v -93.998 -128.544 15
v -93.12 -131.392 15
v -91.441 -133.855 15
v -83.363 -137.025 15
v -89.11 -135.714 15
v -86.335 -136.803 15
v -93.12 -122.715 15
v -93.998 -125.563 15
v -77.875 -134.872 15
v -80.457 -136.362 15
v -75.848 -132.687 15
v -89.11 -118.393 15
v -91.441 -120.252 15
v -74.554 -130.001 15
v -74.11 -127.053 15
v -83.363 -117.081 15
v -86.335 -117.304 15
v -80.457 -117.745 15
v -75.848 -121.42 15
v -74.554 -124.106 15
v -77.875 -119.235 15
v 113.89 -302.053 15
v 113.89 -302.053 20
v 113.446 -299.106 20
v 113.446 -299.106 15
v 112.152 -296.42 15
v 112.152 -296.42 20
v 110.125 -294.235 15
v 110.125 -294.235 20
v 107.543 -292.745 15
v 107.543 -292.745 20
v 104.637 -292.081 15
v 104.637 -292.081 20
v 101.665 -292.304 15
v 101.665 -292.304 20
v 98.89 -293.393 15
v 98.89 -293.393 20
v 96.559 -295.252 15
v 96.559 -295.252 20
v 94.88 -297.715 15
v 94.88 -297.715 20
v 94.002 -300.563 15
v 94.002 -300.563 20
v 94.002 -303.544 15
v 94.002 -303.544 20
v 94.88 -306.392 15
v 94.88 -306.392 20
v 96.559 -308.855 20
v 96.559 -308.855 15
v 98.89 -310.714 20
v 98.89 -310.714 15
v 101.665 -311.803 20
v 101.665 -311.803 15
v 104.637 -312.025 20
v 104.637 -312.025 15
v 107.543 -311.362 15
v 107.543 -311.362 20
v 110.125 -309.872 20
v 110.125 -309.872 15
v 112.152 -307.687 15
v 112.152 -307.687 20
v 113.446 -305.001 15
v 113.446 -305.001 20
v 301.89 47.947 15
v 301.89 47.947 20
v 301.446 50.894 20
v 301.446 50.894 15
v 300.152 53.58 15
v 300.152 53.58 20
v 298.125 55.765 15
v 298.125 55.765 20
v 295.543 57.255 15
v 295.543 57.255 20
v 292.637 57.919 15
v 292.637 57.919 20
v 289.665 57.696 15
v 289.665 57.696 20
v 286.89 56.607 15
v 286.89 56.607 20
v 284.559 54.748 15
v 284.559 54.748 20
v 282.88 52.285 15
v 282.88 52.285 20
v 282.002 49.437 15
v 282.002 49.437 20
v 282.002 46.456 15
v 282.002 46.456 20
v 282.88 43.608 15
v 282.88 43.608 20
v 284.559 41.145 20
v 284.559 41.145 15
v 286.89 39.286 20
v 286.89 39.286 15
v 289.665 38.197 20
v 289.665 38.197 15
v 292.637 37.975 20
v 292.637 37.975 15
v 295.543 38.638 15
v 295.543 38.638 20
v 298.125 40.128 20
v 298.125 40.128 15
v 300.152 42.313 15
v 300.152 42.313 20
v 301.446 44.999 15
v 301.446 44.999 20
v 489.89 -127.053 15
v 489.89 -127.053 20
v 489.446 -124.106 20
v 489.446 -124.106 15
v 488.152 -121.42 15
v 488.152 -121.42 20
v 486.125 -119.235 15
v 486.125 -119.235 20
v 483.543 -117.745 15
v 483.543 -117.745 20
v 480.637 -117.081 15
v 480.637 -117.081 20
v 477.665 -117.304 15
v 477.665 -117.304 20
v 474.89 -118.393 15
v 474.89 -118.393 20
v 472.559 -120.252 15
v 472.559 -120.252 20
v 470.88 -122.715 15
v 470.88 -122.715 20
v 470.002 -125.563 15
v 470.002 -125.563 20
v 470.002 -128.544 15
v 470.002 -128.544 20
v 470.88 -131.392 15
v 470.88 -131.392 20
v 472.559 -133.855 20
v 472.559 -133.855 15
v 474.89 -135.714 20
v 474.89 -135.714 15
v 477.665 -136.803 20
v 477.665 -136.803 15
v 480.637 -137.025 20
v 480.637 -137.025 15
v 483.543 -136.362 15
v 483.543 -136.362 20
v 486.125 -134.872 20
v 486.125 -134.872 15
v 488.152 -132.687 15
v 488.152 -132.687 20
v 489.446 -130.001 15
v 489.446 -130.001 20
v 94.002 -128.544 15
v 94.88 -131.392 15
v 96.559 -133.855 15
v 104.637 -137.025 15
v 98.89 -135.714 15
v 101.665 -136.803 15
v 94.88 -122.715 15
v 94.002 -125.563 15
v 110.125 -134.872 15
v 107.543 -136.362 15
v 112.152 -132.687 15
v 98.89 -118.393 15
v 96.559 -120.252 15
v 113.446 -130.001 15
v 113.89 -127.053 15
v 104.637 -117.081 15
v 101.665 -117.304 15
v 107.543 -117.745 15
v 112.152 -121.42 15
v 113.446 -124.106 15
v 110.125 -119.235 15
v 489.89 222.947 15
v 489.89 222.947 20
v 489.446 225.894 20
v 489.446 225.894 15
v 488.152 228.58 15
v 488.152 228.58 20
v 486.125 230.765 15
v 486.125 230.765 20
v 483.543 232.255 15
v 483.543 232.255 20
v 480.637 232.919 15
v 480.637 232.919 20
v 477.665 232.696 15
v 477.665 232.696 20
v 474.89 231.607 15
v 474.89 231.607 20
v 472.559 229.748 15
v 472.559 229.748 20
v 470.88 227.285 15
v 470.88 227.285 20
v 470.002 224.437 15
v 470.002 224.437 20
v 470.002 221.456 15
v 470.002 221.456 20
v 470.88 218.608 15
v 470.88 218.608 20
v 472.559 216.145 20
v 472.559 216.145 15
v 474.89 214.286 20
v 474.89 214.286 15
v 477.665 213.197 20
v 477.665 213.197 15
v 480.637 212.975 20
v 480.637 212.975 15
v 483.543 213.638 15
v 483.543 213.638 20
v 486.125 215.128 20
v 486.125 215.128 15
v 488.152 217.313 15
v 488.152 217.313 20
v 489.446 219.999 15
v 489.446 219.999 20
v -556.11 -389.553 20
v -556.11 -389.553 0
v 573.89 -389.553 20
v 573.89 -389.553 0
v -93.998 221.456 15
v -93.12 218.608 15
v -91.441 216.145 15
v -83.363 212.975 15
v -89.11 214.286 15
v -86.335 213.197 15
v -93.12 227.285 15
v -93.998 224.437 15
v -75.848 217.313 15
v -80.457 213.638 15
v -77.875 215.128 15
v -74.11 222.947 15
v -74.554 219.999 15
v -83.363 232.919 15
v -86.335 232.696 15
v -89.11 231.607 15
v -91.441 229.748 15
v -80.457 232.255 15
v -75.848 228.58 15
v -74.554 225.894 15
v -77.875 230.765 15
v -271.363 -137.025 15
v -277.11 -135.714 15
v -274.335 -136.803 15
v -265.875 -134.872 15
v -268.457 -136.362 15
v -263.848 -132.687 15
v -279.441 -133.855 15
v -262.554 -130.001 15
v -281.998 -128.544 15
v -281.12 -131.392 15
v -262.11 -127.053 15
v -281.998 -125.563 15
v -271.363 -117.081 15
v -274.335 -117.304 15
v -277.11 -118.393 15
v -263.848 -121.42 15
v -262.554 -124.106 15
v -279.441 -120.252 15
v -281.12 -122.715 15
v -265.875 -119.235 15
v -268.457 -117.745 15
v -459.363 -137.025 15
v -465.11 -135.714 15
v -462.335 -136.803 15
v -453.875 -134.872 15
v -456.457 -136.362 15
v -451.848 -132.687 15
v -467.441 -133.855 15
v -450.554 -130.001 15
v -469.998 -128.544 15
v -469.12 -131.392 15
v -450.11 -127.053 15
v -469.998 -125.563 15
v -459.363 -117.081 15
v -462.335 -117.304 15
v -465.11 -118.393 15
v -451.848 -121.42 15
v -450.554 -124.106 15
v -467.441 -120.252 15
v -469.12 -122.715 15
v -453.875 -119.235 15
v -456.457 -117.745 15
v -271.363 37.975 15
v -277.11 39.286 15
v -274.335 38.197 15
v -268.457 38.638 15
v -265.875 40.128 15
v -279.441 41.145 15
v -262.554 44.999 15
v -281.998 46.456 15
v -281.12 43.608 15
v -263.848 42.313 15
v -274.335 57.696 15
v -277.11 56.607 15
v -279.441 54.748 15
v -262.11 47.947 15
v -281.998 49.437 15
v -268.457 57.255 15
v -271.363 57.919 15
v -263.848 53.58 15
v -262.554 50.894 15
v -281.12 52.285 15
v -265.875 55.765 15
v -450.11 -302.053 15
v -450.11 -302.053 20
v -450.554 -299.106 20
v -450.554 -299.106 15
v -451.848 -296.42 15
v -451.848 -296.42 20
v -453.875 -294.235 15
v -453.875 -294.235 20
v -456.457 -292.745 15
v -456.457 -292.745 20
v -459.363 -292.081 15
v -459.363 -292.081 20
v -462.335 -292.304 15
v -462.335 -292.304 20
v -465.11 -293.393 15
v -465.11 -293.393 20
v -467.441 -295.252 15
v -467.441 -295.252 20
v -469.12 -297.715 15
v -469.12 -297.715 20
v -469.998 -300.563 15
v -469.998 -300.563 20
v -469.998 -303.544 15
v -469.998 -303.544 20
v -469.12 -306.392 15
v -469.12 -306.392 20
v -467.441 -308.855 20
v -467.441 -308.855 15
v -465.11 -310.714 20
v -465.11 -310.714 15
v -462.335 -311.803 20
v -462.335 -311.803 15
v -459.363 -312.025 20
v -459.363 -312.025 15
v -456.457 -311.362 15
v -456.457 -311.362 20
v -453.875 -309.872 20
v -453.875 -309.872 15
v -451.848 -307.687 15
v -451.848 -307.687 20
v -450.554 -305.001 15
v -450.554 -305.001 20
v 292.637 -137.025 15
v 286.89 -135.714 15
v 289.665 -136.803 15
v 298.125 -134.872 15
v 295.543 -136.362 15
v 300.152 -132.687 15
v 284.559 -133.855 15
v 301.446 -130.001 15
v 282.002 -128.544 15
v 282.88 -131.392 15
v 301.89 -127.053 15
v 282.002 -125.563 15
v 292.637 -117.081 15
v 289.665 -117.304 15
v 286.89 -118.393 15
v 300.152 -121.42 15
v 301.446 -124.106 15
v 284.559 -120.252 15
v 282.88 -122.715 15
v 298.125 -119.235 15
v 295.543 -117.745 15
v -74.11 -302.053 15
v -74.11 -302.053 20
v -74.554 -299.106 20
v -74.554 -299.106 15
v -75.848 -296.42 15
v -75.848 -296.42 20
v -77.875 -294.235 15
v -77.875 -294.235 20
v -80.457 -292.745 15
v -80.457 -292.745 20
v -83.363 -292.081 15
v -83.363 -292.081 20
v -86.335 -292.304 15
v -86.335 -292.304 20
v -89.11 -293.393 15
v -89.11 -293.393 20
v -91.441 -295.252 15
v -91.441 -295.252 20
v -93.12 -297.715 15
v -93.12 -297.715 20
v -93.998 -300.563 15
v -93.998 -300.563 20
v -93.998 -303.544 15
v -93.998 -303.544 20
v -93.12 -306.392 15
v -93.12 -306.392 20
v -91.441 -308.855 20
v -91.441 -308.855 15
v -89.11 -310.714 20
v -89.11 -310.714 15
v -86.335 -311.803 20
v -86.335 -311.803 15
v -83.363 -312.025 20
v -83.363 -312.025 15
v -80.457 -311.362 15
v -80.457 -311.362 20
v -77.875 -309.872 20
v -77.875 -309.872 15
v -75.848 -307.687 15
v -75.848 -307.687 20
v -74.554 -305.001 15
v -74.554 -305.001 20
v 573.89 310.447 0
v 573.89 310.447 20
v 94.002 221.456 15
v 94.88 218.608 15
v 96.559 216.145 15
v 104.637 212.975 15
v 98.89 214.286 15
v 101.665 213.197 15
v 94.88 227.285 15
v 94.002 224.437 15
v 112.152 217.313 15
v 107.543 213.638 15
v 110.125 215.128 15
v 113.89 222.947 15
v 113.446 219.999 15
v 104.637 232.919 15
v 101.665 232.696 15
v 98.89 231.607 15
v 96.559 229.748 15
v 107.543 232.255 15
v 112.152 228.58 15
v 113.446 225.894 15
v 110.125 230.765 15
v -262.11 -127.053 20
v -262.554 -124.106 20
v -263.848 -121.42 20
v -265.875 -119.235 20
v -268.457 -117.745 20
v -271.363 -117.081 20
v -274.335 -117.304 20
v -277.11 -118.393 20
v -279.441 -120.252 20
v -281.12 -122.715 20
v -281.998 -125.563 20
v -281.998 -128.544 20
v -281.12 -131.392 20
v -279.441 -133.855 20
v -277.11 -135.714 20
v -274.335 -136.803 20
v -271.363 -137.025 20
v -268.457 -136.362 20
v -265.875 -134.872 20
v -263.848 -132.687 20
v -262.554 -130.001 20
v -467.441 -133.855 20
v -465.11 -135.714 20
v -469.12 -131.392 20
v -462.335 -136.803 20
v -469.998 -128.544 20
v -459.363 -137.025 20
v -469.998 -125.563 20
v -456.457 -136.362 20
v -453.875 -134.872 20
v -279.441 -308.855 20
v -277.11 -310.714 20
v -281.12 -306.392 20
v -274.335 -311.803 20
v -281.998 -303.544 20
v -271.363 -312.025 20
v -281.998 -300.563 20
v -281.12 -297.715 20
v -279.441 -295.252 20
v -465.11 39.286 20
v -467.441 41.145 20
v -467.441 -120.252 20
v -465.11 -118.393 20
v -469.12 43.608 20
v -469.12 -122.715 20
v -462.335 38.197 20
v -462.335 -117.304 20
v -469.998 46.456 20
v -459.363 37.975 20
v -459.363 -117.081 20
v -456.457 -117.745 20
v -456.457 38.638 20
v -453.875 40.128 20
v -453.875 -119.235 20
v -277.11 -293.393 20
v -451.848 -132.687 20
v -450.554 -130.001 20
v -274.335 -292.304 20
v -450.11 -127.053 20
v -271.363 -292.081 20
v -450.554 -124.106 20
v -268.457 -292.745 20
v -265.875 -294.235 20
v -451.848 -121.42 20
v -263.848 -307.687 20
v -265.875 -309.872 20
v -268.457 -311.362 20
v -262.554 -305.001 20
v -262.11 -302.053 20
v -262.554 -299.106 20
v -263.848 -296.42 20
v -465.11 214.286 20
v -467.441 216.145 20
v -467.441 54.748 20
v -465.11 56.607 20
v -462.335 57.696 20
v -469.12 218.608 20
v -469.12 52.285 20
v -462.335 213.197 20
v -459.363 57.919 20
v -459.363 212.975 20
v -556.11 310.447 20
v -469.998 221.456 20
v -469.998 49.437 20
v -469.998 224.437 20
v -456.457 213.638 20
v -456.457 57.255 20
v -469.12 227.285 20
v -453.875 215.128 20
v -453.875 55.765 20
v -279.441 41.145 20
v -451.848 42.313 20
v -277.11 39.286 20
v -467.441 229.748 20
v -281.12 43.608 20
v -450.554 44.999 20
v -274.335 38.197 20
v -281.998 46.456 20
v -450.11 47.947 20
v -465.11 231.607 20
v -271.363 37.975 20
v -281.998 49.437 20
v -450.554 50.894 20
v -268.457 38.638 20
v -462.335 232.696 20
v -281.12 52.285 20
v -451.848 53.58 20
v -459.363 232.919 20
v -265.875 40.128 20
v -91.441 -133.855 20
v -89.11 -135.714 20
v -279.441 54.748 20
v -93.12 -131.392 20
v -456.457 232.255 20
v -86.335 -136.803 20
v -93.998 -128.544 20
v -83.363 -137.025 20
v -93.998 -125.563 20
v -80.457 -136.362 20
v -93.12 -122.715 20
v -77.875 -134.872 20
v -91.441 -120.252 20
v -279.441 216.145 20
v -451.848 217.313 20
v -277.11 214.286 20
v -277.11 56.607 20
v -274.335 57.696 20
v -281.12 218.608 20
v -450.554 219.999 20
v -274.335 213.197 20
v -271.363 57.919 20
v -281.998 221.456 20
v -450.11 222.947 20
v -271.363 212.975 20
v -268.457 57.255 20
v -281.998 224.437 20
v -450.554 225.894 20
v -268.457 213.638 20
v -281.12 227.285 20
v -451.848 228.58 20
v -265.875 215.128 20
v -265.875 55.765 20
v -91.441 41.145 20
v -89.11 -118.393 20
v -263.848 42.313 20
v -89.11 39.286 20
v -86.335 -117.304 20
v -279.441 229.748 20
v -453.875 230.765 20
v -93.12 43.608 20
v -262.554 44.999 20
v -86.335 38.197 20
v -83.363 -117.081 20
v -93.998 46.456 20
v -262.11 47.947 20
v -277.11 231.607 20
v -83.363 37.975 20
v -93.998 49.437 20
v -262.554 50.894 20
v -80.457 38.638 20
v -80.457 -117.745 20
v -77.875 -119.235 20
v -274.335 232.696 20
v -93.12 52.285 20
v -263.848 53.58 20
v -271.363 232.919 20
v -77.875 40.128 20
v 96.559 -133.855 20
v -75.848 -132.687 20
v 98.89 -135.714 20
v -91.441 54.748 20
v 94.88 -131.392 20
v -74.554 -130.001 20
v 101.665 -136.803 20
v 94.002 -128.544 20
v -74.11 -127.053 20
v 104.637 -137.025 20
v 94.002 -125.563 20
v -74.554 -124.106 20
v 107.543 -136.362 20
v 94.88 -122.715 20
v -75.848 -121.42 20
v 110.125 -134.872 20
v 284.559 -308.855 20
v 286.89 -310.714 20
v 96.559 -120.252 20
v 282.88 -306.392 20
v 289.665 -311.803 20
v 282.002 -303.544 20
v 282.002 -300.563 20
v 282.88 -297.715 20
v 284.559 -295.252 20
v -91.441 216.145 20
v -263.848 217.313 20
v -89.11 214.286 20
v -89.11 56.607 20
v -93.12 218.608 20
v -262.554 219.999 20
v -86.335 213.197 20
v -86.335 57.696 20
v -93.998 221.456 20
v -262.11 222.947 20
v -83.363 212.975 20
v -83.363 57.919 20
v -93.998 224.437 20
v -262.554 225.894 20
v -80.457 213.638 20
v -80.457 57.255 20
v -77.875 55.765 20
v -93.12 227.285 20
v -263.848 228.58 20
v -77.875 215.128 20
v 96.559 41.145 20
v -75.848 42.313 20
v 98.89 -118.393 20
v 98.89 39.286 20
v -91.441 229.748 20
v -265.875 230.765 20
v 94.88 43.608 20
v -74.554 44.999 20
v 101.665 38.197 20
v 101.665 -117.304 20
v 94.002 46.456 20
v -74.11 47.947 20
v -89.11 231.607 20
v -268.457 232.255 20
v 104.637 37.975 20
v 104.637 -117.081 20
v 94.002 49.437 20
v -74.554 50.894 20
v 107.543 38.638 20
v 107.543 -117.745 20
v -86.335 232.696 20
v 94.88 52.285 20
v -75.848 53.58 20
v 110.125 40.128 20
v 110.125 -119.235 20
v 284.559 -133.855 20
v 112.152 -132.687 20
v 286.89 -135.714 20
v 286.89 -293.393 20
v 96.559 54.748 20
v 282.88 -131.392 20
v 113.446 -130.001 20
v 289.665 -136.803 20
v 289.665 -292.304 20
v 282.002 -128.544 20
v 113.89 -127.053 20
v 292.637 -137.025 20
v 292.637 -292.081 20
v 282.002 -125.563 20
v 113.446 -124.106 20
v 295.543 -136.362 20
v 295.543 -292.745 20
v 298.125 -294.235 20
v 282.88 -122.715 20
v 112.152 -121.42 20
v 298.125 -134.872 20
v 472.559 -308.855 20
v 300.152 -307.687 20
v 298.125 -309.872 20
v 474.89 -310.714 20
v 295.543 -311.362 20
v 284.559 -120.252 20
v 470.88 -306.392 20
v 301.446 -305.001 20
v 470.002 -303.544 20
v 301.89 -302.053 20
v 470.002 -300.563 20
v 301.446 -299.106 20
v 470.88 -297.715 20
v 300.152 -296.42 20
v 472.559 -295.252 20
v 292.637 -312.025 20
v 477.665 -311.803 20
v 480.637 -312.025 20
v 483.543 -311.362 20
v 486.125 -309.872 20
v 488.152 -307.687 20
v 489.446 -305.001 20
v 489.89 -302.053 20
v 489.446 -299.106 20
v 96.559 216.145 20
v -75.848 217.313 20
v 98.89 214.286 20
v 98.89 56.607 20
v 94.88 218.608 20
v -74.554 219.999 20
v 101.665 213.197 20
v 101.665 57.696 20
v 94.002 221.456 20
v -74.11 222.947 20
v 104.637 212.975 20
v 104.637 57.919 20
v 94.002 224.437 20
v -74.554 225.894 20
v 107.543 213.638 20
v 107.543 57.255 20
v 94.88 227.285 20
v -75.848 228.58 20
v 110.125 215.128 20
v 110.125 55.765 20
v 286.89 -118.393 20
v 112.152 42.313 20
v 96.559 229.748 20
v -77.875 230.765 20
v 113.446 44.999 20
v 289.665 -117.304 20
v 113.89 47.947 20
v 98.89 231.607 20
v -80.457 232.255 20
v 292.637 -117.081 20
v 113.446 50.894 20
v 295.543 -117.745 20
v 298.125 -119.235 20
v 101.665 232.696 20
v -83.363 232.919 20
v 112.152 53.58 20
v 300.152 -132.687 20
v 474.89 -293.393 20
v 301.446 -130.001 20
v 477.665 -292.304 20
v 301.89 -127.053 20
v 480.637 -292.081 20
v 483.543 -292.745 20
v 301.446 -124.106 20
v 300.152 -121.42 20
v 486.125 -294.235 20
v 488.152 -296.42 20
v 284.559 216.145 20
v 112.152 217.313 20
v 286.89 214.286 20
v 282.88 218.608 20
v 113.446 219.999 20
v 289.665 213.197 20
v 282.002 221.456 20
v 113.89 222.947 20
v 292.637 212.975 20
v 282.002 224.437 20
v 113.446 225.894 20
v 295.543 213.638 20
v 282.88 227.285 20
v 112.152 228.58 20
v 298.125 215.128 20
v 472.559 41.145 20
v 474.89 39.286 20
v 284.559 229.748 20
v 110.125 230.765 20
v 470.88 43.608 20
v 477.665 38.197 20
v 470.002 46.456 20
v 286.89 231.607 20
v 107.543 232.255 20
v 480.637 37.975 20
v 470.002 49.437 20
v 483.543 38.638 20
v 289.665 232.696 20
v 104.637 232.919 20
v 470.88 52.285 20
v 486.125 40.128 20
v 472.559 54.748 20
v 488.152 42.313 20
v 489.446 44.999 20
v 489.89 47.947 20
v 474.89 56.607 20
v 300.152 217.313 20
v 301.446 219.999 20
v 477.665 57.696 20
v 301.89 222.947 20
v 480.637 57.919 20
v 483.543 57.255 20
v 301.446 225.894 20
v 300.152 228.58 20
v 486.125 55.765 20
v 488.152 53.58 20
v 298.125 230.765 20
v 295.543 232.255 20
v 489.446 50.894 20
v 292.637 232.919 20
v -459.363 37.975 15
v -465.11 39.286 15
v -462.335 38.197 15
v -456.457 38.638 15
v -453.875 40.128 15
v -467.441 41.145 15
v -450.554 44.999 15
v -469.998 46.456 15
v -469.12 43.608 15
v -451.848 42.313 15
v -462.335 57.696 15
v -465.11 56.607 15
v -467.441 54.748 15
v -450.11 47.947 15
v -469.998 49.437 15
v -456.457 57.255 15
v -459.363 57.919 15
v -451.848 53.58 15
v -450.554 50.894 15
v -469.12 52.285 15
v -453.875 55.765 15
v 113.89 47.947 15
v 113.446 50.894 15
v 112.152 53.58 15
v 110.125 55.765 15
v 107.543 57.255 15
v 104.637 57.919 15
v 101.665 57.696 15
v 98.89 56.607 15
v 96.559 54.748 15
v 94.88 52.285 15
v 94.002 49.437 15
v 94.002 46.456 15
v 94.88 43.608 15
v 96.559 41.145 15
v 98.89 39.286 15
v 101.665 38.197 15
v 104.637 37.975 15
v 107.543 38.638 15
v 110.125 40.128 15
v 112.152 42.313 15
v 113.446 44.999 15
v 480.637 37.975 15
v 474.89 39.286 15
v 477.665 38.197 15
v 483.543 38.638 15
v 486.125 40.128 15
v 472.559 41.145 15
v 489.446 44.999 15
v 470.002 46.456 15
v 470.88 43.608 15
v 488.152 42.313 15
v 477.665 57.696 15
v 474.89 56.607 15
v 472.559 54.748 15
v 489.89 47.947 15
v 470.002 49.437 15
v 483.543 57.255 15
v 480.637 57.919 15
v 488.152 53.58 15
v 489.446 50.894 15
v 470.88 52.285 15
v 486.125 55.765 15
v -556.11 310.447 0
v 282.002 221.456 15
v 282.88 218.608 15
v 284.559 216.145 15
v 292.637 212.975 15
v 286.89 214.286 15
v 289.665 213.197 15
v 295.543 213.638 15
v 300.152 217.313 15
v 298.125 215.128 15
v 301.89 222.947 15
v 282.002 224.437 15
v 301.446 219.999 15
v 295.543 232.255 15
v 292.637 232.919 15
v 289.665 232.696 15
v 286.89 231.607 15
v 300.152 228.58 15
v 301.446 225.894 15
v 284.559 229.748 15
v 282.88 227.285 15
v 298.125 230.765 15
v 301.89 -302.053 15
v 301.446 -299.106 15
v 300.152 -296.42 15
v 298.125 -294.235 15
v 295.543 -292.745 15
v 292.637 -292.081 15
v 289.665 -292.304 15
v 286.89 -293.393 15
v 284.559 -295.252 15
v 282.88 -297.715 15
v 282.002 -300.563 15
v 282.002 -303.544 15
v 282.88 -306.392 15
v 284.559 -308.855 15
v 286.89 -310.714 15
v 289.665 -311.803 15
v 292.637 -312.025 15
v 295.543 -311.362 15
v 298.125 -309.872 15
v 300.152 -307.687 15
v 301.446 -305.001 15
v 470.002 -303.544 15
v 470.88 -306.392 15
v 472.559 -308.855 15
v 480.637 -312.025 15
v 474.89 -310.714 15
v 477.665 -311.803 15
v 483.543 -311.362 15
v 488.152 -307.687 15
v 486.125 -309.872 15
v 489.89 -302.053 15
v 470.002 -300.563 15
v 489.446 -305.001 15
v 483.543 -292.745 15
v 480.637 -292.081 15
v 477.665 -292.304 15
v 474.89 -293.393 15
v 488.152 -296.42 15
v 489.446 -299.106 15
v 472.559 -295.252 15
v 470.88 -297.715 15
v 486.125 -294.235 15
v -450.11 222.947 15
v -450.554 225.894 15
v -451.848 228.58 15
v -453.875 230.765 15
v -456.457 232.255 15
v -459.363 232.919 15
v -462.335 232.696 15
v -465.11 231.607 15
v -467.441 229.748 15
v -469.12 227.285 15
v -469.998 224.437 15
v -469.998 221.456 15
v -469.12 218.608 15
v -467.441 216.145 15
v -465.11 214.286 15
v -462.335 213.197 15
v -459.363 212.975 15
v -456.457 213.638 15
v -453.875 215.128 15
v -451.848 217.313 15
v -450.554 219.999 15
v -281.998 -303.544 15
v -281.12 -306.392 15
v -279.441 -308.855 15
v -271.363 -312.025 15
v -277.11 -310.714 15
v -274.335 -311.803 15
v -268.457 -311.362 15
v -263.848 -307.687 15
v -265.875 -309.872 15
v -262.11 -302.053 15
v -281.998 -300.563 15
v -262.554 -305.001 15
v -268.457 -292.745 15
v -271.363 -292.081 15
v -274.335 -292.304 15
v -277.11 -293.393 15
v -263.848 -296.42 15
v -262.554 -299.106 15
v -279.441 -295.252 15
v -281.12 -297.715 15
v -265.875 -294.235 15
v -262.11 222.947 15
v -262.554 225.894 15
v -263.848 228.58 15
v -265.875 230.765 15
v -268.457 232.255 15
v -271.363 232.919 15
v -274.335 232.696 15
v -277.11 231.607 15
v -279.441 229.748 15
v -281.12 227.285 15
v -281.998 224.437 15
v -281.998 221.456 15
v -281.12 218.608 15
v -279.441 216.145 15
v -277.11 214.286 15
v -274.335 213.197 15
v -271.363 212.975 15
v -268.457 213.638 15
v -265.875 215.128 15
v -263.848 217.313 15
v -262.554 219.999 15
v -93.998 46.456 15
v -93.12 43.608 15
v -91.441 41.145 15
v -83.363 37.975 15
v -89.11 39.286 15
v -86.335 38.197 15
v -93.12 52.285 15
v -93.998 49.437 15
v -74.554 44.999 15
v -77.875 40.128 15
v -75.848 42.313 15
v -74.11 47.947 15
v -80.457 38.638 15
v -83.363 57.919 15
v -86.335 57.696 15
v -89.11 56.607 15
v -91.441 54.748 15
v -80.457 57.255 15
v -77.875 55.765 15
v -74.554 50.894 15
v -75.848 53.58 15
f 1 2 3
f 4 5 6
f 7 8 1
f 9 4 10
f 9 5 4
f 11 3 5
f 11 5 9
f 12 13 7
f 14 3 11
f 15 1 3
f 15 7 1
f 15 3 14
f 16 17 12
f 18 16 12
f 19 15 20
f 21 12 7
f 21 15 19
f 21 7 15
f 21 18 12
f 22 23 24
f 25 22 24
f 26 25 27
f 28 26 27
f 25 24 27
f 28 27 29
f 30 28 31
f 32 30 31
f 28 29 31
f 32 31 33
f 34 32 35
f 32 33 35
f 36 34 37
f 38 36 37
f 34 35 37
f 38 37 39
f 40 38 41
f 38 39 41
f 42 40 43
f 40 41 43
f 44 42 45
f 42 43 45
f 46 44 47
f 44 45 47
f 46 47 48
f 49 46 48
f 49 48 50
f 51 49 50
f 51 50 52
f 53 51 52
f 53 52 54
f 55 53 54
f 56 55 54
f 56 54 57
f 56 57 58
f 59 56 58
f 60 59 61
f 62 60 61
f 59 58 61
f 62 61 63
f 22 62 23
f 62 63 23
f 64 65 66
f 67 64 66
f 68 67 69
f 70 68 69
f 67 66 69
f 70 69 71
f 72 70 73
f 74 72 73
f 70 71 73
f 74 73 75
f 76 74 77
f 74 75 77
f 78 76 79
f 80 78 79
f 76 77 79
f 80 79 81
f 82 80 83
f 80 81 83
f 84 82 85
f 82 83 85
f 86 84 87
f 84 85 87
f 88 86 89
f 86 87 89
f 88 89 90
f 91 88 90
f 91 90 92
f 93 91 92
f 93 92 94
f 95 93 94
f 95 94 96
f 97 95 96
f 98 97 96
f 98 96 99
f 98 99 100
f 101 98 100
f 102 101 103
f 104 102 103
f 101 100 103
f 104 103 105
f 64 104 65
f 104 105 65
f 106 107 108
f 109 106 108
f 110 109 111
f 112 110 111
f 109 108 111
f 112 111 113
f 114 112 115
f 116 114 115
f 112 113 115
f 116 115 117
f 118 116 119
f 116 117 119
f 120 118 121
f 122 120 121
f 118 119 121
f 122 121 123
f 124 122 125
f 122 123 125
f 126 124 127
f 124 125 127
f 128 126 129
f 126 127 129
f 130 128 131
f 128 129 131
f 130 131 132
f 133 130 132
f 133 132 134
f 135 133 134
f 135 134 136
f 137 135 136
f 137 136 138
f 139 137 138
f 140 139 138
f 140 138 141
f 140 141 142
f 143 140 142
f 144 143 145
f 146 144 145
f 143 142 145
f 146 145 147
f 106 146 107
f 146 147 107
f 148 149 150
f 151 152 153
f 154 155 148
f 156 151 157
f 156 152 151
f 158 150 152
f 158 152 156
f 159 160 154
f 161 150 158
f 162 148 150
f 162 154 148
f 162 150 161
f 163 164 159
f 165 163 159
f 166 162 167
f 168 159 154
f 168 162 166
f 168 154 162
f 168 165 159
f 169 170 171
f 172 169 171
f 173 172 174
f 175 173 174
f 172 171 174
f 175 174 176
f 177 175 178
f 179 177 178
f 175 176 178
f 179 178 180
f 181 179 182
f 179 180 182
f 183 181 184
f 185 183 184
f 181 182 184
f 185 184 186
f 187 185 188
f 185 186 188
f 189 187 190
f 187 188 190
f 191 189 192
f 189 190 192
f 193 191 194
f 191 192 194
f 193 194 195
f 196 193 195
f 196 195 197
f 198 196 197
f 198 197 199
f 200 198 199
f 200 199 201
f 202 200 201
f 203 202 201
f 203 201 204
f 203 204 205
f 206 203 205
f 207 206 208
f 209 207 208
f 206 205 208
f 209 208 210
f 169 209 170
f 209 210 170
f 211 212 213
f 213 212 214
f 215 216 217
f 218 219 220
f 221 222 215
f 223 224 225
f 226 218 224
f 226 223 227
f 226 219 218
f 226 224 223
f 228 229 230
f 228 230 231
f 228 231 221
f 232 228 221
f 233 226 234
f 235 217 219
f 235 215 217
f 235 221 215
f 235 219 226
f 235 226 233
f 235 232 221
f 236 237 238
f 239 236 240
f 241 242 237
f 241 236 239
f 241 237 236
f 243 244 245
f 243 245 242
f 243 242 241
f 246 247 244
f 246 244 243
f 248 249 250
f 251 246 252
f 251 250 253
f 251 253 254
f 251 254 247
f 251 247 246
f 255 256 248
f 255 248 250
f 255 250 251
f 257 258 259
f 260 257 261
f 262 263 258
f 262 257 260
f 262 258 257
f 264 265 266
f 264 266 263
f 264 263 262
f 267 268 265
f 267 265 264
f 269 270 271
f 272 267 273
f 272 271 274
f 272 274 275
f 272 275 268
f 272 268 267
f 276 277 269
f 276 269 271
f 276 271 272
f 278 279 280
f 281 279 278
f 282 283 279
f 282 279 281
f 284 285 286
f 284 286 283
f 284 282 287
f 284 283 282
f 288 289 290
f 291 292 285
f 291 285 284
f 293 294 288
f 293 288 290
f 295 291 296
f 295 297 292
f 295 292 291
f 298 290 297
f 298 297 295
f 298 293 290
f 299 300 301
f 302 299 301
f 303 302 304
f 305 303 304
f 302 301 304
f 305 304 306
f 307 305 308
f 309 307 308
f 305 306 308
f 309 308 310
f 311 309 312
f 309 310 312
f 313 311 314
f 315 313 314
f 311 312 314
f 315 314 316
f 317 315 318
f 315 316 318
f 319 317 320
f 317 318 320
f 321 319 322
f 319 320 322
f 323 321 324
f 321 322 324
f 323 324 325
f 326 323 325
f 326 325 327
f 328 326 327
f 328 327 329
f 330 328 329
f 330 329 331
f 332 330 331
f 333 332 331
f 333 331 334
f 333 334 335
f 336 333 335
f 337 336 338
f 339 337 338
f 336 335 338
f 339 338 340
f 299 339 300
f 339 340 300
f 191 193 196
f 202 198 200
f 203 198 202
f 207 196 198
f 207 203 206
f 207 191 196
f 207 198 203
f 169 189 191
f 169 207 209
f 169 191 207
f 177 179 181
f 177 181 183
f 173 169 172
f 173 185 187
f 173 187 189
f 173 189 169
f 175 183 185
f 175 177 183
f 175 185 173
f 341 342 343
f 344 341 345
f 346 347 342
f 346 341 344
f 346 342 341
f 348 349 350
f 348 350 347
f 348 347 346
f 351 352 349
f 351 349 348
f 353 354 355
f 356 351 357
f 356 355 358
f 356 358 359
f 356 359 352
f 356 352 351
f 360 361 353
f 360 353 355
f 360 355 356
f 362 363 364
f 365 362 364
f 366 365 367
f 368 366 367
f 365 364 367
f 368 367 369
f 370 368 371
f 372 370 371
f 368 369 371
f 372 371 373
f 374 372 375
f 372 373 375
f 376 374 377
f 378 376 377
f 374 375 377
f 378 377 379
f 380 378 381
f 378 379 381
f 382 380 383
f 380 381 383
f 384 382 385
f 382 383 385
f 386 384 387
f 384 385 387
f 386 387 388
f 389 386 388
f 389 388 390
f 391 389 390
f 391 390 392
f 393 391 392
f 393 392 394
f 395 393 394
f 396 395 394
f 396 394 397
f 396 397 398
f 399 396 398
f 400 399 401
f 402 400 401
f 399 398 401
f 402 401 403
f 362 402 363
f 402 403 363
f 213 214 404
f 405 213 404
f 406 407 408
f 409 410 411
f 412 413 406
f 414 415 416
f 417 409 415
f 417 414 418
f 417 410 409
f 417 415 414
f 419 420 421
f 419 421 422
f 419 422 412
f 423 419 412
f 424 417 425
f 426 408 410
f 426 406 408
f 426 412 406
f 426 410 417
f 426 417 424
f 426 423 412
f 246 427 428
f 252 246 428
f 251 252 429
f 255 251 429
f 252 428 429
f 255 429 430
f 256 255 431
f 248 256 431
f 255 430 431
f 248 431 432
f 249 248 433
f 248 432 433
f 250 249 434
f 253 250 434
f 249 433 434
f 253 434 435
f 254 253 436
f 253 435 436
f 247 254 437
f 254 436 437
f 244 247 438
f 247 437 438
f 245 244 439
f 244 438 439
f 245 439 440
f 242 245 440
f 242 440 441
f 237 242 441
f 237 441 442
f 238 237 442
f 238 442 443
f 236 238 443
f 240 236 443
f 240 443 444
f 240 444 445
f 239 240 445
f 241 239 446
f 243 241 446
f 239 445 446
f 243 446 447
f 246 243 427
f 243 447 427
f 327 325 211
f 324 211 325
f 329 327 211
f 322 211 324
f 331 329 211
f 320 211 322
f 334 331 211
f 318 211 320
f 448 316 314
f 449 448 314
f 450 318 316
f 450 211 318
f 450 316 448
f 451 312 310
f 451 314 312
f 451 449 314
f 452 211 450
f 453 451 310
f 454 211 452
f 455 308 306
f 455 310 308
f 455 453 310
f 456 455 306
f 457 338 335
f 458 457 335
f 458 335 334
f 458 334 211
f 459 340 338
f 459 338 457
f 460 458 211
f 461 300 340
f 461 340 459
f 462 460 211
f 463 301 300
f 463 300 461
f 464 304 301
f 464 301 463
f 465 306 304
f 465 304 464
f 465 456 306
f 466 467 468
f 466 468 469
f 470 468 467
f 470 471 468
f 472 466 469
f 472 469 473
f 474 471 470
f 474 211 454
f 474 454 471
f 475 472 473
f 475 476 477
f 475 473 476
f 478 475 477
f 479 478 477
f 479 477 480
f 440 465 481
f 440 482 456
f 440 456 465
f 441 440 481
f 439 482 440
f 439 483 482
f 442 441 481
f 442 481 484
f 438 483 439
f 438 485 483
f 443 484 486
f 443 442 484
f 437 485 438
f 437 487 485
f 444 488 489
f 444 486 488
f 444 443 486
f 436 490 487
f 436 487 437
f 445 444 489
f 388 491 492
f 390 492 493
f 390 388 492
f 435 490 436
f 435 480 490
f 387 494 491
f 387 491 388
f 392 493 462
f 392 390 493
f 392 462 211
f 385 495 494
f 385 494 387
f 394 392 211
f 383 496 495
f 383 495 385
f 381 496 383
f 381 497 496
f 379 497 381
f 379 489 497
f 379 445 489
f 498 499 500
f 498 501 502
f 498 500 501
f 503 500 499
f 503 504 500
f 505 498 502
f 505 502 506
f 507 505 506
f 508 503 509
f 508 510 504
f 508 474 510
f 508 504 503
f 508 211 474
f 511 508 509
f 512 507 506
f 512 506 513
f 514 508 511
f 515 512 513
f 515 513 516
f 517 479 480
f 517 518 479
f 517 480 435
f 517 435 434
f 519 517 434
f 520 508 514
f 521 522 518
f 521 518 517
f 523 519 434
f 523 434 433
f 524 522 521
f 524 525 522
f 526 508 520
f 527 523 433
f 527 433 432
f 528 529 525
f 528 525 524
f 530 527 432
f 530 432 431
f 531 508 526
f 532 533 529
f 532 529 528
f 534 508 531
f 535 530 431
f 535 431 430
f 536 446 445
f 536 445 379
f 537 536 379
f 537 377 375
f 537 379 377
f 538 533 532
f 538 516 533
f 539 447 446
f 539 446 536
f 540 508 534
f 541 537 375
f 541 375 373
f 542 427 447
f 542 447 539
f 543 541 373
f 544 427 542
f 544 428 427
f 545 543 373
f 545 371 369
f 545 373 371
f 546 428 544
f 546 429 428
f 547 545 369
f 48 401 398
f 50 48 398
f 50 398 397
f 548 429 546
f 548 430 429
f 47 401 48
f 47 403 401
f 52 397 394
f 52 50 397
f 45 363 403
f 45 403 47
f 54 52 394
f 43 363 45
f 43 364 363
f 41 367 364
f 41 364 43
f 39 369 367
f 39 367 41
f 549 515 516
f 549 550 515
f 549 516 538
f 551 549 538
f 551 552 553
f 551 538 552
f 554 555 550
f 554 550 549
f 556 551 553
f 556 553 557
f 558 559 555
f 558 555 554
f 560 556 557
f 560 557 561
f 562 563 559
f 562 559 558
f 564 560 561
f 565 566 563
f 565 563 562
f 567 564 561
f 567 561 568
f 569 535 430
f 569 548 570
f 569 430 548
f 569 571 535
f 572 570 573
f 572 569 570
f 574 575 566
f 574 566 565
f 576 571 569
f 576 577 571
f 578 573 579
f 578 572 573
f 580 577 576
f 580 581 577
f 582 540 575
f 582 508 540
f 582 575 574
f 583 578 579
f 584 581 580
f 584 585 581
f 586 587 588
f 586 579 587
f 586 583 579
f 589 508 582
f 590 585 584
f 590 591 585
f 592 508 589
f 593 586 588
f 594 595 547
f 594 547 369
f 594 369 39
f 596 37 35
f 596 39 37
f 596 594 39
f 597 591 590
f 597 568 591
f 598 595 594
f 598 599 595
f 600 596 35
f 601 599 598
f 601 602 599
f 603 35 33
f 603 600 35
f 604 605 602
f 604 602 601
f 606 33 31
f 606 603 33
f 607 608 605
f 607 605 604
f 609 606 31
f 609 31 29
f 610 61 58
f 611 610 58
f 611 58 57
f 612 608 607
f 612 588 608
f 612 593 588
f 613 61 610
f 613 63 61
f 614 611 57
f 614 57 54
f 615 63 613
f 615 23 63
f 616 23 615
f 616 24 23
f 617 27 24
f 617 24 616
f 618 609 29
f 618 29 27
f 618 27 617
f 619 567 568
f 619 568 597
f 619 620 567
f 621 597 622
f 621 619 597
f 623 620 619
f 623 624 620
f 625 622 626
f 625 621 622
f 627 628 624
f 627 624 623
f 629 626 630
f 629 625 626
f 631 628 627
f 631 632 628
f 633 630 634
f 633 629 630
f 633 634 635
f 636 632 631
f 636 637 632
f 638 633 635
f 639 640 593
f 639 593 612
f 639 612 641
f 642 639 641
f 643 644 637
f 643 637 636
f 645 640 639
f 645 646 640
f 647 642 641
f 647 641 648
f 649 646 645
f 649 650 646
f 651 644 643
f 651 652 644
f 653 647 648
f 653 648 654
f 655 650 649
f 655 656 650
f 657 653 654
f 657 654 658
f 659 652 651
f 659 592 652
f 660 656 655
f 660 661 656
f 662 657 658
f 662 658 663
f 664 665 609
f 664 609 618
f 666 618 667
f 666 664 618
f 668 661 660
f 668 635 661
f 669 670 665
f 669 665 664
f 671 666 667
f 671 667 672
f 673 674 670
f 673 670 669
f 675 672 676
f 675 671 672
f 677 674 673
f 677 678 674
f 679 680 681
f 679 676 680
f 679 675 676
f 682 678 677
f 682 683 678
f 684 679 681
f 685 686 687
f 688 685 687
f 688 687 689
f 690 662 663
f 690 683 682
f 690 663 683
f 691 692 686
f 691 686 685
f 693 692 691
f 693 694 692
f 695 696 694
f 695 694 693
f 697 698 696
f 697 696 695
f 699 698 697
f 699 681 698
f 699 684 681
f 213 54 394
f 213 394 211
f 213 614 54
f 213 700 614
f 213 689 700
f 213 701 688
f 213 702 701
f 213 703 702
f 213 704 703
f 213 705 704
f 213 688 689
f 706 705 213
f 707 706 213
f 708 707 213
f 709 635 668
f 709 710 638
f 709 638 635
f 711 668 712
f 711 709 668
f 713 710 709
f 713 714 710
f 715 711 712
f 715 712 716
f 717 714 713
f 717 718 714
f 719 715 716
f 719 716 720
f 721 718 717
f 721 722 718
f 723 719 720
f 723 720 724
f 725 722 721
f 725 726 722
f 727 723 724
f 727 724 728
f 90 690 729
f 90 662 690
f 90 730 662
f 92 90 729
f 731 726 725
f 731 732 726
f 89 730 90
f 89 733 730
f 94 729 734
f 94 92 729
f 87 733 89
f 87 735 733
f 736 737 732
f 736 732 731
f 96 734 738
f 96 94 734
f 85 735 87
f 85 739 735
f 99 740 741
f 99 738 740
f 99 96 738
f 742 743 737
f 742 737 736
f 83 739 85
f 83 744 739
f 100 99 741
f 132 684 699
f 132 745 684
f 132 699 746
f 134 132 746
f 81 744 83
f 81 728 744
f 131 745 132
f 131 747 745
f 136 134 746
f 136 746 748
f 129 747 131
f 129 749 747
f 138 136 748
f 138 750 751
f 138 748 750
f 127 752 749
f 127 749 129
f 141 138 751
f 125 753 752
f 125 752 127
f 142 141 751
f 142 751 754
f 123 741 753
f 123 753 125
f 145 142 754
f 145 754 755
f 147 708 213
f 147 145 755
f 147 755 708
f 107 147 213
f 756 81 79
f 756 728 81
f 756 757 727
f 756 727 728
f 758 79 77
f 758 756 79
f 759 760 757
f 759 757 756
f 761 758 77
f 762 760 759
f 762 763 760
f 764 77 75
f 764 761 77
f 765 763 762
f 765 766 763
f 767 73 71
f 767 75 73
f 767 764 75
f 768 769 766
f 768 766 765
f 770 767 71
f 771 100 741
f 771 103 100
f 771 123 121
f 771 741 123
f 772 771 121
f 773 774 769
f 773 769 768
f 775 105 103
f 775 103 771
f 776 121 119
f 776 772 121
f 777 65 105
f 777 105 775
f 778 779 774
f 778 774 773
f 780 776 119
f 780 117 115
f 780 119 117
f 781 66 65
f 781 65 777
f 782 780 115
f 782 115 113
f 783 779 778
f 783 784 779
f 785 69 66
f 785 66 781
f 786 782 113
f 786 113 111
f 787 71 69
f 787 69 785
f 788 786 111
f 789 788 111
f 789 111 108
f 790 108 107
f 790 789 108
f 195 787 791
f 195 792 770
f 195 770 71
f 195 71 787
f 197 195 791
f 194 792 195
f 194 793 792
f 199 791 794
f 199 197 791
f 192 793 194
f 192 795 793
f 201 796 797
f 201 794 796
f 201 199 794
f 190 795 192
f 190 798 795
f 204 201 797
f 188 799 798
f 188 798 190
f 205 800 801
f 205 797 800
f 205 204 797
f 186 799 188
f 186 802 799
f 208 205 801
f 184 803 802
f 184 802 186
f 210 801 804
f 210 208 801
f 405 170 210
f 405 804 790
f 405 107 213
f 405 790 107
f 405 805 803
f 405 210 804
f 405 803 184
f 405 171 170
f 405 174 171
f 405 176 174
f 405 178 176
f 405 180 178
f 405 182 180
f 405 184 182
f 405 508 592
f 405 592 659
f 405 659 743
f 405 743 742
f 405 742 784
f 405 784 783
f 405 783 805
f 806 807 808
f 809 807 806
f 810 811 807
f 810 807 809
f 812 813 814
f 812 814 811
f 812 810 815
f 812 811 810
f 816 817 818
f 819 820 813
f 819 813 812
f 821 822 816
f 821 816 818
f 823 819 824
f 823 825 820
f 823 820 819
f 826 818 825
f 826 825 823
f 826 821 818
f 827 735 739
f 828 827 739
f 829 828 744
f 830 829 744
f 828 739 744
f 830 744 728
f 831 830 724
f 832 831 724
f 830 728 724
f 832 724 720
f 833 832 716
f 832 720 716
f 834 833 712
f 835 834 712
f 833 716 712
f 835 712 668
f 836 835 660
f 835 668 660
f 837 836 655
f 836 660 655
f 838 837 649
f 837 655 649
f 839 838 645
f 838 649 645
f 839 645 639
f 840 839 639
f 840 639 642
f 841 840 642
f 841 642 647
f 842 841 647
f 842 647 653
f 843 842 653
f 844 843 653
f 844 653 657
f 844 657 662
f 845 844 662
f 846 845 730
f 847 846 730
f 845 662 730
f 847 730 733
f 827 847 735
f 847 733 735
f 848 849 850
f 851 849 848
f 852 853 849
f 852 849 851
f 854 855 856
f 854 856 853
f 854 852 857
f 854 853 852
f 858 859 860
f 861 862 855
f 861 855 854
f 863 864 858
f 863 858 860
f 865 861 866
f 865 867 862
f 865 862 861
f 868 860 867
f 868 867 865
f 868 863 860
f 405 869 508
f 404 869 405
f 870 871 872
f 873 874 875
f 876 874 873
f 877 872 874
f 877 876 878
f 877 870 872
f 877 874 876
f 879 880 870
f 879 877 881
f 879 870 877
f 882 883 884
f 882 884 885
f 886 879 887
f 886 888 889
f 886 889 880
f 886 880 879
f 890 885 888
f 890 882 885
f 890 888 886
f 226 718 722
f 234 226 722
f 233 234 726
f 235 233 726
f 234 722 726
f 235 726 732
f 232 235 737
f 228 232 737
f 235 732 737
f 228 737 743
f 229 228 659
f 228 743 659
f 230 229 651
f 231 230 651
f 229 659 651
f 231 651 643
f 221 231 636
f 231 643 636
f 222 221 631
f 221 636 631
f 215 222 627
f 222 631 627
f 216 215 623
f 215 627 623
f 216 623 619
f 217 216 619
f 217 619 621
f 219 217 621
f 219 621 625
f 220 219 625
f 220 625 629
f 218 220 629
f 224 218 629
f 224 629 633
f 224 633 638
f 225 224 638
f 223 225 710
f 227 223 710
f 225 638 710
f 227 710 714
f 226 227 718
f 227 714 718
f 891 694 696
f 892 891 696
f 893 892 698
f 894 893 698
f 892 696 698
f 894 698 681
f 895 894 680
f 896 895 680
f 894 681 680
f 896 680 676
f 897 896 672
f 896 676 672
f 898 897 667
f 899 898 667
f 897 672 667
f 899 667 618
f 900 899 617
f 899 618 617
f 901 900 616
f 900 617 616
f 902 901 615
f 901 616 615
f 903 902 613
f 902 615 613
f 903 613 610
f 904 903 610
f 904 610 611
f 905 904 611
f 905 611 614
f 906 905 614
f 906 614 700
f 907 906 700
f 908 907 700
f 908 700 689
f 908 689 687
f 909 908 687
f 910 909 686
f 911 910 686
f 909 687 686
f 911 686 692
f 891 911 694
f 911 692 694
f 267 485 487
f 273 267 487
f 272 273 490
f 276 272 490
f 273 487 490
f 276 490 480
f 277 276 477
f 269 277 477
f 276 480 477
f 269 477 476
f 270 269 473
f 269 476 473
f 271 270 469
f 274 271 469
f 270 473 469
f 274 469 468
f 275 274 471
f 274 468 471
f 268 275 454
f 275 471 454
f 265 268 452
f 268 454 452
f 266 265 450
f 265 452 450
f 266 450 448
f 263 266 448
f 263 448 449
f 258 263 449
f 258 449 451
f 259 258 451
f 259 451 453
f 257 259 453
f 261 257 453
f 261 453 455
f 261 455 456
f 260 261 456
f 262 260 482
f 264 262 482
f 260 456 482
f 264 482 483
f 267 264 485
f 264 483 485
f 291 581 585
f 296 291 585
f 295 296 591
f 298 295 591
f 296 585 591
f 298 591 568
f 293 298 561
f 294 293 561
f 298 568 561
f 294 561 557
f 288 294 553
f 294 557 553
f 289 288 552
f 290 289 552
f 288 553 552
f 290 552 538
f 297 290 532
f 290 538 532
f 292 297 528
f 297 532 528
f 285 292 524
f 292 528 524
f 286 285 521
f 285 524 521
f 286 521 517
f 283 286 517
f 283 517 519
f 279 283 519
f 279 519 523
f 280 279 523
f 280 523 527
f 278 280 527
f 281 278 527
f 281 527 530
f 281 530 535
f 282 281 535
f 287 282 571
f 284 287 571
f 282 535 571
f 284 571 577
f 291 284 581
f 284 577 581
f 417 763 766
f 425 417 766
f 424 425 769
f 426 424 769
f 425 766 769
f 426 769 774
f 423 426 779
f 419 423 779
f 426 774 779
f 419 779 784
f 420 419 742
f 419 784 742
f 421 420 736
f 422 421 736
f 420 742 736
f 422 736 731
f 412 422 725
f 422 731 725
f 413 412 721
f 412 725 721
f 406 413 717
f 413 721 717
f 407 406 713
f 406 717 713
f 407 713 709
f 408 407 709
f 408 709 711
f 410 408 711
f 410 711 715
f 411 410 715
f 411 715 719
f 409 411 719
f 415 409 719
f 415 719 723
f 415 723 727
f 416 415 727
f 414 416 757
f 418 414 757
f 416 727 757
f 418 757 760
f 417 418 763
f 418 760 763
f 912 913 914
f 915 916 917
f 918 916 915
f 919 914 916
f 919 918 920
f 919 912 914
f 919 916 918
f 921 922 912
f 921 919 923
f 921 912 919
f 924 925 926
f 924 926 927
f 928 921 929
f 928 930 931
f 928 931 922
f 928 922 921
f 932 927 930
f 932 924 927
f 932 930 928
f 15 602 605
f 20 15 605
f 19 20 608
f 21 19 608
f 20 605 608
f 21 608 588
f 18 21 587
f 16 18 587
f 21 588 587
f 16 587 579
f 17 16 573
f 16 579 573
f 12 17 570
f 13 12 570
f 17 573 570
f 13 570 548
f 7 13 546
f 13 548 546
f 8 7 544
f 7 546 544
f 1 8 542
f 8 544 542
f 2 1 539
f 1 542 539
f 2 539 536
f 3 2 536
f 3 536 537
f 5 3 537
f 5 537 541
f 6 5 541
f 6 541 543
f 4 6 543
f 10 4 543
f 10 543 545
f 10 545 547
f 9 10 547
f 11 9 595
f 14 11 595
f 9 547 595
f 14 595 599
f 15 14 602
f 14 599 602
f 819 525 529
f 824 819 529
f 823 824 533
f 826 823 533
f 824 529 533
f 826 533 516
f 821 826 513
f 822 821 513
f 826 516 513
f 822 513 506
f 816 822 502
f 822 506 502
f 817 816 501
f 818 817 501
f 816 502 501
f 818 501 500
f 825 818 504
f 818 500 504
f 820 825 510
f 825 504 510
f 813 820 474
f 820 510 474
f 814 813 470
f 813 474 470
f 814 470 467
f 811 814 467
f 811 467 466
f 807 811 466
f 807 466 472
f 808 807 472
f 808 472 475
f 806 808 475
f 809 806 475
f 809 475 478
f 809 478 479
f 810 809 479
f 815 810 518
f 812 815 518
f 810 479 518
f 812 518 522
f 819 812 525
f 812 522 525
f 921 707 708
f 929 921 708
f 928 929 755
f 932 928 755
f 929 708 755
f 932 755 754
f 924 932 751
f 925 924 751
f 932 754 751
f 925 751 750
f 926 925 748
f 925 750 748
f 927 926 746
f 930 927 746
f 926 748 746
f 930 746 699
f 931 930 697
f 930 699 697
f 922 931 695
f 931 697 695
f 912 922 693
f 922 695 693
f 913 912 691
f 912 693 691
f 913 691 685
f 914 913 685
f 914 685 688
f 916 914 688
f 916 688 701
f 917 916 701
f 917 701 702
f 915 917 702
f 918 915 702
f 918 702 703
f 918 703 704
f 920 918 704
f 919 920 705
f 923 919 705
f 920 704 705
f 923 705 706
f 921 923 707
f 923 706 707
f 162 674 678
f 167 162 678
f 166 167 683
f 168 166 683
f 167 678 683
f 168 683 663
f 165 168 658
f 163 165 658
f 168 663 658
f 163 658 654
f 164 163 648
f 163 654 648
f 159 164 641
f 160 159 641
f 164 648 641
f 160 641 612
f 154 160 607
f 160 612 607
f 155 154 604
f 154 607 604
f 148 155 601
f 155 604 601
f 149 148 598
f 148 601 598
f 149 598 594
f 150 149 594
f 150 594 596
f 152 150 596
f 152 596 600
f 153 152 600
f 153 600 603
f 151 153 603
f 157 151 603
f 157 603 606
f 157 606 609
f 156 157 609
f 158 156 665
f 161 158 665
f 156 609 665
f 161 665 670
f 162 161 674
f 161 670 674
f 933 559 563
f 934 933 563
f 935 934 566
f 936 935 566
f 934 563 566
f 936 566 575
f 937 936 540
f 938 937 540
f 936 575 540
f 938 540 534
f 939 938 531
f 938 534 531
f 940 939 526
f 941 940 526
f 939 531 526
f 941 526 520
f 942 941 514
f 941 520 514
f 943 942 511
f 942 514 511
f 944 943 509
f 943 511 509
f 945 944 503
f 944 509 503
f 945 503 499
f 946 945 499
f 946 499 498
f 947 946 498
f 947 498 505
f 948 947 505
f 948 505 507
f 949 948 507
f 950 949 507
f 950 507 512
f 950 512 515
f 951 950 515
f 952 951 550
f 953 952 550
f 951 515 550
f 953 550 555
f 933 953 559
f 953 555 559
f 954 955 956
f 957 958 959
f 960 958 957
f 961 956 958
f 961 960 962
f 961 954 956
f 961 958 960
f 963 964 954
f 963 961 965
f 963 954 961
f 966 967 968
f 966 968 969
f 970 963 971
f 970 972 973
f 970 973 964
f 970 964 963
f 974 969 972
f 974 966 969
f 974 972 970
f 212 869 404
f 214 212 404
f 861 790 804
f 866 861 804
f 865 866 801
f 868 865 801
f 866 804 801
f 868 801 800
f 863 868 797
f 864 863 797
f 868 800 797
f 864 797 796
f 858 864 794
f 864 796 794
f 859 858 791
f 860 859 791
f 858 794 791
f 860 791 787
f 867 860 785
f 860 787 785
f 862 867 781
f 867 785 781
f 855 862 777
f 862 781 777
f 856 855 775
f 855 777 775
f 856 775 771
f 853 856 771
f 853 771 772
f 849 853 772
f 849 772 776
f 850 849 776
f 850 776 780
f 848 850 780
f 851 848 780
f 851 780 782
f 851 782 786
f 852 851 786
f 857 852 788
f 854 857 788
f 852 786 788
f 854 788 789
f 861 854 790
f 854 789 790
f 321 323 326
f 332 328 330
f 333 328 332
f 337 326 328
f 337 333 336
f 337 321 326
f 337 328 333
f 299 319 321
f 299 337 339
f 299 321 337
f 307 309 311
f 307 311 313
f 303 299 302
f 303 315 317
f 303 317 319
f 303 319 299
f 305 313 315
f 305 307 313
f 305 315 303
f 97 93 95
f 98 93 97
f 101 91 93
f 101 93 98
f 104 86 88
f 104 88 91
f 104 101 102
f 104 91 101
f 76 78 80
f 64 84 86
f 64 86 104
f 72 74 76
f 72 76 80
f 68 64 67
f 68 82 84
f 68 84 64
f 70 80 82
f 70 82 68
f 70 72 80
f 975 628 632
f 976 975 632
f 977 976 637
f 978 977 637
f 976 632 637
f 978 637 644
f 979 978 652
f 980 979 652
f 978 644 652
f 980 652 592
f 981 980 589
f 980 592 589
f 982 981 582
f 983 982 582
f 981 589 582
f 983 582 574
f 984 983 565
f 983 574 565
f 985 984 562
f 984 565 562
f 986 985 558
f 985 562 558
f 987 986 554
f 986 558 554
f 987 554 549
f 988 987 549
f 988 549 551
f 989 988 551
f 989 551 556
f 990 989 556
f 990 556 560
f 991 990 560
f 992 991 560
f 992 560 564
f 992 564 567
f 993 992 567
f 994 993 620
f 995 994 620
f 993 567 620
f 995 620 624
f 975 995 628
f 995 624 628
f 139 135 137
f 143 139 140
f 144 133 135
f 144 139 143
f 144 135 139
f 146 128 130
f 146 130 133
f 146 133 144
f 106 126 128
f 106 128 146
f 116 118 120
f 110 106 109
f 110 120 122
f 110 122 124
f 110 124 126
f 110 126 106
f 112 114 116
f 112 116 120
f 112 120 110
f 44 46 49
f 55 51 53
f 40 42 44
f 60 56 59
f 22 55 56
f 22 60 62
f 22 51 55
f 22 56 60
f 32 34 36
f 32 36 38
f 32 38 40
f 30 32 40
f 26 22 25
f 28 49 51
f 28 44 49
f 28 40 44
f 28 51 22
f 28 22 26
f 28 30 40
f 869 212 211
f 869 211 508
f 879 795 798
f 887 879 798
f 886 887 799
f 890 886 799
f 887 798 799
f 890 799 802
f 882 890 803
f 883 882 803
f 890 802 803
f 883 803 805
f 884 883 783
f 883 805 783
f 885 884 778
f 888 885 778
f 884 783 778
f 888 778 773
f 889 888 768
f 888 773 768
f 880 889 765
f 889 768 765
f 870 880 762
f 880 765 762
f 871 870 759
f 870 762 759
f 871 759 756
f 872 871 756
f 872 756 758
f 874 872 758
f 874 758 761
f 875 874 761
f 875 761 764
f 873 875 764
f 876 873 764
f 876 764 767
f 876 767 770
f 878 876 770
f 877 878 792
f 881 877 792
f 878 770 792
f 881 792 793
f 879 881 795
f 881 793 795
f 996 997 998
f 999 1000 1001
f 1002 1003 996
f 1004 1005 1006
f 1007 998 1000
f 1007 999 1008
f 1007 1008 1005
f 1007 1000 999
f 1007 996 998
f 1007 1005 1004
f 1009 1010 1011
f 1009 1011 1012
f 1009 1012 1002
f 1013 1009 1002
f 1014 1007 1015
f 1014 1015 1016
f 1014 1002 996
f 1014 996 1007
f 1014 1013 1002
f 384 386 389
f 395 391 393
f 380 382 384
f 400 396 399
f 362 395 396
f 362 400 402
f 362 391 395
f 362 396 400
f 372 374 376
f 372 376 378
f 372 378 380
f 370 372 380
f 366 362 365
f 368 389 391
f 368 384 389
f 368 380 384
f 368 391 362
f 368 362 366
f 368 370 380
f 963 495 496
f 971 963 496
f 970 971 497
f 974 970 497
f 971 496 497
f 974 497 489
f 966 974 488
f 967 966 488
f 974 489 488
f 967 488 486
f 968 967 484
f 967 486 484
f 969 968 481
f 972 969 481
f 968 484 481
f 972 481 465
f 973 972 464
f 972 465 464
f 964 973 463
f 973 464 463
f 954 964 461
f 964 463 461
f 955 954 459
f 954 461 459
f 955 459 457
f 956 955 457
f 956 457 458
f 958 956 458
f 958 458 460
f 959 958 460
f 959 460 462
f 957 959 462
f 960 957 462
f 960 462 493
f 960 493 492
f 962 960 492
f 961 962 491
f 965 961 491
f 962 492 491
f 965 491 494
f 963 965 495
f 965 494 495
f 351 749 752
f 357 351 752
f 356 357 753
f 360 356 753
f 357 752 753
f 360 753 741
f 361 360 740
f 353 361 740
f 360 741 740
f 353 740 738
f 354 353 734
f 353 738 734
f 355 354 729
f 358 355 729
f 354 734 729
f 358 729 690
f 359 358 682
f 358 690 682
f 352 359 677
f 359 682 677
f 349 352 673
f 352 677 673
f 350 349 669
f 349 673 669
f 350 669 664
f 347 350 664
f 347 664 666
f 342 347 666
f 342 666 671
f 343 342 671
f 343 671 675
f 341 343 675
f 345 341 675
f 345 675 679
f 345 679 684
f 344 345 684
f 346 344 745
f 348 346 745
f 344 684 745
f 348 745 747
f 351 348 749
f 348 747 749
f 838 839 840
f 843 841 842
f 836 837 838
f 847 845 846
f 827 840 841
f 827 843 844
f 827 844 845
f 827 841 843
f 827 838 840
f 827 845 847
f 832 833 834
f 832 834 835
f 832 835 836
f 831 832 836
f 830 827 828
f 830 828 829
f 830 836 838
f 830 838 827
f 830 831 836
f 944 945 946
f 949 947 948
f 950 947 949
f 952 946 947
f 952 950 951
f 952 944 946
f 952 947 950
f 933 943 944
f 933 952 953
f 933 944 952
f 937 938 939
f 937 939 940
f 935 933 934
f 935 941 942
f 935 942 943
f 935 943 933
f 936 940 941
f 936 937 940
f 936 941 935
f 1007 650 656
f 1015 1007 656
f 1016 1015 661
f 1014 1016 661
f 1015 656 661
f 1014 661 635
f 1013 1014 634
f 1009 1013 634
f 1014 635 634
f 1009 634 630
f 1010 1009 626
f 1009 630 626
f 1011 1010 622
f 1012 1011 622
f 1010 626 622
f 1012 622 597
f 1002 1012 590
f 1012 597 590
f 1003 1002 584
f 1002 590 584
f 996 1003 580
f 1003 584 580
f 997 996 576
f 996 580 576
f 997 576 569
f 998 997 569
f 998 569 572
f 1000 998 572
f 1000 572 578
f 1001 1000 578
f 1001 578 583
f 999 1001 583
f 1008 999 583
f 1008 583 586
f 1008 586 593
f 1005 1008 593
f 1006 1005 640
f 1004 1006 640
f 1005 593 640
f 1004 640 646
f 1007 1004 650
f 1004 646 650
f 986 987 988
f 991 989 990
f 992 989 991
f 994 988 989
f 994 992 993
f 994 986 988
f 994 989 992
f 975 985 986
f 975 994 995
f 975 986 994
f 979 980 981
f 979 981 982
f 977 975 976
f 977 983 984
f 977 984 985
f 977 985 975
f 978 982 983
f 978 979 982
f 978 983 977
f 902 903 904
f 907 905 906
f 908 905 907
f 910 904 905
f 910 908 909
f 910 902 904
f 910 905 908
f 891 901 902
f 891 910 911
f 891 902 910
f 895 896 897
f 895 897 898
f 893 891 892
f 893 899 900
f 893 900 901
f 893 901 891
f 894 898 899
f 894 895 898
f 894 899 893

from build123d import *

# Parameters (mm, degrees)
F0_W     = 1130
F0_H     = 700
F1_DEPTH = 20
F2_R     = 10
F3_DEPTH = 5
F4_DEPTH = 5


with BuildPart() as f1:
    # F0 (on Top) → F1 (new body)
    with BuildSketch(Plane.XY):
        with Locations((8.889999, -39.553397)):
            Rectangle(F0_W, F0_H)
    extrude(amount=F1_DEPTH)

    # F2 (on face) → F3 (cut)
    with BuildSketch(Plane.XY.offset(20)):
        with Locations((479.889999, 222.946603)):
            Circle(F2_R)
    extrude(amount=-F3_DEPTH, mode=Mode.SUBTRACT)

    # F2 (on face) → F4 (cut)
    with BuildSketch(Plane.XY.offset(20)):
        with Locations((479.889999, 222.946603)):
            Circle(F2_R)
        with Locations((291.889999, 222.946603)):
            Circle(F2_R)
        with Locations((103.889999, 222.946603)):
            Circle(F2_R)
        with Locations((-84.110001, 222.946603)):
            Circle(F2_R)
        with Locations((-272.110001, 222.946603)):
            Circle(F2_R)
        with Locations((-460.110001, 222.946603)):
            Circle(F2_R)
        with Locations((-460.110001, 47.946603)):
            Circle(F2_R)
        with Locations((-460.110001, -127.053397)):
            Circle(F2_R)
        with Locations((-460.110001, -302.053397)):
            Circle(F2_R)
        with Locations((-272.110001, -302.053397)):
            Circle(F2_R)
        with Locations((-84.110001, -302.053397)):
            Circle(F2_R)
        with Locations((103.889999, -302.053397)):
            Circle(F2_R)
        with Locations((291.889999, -302.053397)):
            Circle(F2_R)
        with Locations((479.889999, -302.053397)):
            Circle(F2_R)
        with Locations((479.889999, -127.053397)):
            Circle(F2_R)
        with Locations((479.889999, 47.946603)):
            Circle(F2_R)
        with Locations((291.889999, 47.946603)):
            Circle(F2_R)
        with Locations((291.889999, -127.053397)):
            Circle(F2_R)
        with Locations((103.889999, -127.053397)):
            Circle(F2_R)
        with Locations((-84.110001, -127.053397)):
            Circle(F2_R)
        with Locations((-272.110001, -127.053397)):
            Circle(F2_R)
        with Locations((-272.110001, 47.946603)):
            Circle(F2_R)
        with Locations((-84.110001, 47.946603)):
            Circle(F2_R)
        with Locations((103.889999, 47.946603)):
            Circle(F2_R)
    extrude(amount=-F4_DEPTH, mode=Mode.SUBTRACT)


solid = f1.part
